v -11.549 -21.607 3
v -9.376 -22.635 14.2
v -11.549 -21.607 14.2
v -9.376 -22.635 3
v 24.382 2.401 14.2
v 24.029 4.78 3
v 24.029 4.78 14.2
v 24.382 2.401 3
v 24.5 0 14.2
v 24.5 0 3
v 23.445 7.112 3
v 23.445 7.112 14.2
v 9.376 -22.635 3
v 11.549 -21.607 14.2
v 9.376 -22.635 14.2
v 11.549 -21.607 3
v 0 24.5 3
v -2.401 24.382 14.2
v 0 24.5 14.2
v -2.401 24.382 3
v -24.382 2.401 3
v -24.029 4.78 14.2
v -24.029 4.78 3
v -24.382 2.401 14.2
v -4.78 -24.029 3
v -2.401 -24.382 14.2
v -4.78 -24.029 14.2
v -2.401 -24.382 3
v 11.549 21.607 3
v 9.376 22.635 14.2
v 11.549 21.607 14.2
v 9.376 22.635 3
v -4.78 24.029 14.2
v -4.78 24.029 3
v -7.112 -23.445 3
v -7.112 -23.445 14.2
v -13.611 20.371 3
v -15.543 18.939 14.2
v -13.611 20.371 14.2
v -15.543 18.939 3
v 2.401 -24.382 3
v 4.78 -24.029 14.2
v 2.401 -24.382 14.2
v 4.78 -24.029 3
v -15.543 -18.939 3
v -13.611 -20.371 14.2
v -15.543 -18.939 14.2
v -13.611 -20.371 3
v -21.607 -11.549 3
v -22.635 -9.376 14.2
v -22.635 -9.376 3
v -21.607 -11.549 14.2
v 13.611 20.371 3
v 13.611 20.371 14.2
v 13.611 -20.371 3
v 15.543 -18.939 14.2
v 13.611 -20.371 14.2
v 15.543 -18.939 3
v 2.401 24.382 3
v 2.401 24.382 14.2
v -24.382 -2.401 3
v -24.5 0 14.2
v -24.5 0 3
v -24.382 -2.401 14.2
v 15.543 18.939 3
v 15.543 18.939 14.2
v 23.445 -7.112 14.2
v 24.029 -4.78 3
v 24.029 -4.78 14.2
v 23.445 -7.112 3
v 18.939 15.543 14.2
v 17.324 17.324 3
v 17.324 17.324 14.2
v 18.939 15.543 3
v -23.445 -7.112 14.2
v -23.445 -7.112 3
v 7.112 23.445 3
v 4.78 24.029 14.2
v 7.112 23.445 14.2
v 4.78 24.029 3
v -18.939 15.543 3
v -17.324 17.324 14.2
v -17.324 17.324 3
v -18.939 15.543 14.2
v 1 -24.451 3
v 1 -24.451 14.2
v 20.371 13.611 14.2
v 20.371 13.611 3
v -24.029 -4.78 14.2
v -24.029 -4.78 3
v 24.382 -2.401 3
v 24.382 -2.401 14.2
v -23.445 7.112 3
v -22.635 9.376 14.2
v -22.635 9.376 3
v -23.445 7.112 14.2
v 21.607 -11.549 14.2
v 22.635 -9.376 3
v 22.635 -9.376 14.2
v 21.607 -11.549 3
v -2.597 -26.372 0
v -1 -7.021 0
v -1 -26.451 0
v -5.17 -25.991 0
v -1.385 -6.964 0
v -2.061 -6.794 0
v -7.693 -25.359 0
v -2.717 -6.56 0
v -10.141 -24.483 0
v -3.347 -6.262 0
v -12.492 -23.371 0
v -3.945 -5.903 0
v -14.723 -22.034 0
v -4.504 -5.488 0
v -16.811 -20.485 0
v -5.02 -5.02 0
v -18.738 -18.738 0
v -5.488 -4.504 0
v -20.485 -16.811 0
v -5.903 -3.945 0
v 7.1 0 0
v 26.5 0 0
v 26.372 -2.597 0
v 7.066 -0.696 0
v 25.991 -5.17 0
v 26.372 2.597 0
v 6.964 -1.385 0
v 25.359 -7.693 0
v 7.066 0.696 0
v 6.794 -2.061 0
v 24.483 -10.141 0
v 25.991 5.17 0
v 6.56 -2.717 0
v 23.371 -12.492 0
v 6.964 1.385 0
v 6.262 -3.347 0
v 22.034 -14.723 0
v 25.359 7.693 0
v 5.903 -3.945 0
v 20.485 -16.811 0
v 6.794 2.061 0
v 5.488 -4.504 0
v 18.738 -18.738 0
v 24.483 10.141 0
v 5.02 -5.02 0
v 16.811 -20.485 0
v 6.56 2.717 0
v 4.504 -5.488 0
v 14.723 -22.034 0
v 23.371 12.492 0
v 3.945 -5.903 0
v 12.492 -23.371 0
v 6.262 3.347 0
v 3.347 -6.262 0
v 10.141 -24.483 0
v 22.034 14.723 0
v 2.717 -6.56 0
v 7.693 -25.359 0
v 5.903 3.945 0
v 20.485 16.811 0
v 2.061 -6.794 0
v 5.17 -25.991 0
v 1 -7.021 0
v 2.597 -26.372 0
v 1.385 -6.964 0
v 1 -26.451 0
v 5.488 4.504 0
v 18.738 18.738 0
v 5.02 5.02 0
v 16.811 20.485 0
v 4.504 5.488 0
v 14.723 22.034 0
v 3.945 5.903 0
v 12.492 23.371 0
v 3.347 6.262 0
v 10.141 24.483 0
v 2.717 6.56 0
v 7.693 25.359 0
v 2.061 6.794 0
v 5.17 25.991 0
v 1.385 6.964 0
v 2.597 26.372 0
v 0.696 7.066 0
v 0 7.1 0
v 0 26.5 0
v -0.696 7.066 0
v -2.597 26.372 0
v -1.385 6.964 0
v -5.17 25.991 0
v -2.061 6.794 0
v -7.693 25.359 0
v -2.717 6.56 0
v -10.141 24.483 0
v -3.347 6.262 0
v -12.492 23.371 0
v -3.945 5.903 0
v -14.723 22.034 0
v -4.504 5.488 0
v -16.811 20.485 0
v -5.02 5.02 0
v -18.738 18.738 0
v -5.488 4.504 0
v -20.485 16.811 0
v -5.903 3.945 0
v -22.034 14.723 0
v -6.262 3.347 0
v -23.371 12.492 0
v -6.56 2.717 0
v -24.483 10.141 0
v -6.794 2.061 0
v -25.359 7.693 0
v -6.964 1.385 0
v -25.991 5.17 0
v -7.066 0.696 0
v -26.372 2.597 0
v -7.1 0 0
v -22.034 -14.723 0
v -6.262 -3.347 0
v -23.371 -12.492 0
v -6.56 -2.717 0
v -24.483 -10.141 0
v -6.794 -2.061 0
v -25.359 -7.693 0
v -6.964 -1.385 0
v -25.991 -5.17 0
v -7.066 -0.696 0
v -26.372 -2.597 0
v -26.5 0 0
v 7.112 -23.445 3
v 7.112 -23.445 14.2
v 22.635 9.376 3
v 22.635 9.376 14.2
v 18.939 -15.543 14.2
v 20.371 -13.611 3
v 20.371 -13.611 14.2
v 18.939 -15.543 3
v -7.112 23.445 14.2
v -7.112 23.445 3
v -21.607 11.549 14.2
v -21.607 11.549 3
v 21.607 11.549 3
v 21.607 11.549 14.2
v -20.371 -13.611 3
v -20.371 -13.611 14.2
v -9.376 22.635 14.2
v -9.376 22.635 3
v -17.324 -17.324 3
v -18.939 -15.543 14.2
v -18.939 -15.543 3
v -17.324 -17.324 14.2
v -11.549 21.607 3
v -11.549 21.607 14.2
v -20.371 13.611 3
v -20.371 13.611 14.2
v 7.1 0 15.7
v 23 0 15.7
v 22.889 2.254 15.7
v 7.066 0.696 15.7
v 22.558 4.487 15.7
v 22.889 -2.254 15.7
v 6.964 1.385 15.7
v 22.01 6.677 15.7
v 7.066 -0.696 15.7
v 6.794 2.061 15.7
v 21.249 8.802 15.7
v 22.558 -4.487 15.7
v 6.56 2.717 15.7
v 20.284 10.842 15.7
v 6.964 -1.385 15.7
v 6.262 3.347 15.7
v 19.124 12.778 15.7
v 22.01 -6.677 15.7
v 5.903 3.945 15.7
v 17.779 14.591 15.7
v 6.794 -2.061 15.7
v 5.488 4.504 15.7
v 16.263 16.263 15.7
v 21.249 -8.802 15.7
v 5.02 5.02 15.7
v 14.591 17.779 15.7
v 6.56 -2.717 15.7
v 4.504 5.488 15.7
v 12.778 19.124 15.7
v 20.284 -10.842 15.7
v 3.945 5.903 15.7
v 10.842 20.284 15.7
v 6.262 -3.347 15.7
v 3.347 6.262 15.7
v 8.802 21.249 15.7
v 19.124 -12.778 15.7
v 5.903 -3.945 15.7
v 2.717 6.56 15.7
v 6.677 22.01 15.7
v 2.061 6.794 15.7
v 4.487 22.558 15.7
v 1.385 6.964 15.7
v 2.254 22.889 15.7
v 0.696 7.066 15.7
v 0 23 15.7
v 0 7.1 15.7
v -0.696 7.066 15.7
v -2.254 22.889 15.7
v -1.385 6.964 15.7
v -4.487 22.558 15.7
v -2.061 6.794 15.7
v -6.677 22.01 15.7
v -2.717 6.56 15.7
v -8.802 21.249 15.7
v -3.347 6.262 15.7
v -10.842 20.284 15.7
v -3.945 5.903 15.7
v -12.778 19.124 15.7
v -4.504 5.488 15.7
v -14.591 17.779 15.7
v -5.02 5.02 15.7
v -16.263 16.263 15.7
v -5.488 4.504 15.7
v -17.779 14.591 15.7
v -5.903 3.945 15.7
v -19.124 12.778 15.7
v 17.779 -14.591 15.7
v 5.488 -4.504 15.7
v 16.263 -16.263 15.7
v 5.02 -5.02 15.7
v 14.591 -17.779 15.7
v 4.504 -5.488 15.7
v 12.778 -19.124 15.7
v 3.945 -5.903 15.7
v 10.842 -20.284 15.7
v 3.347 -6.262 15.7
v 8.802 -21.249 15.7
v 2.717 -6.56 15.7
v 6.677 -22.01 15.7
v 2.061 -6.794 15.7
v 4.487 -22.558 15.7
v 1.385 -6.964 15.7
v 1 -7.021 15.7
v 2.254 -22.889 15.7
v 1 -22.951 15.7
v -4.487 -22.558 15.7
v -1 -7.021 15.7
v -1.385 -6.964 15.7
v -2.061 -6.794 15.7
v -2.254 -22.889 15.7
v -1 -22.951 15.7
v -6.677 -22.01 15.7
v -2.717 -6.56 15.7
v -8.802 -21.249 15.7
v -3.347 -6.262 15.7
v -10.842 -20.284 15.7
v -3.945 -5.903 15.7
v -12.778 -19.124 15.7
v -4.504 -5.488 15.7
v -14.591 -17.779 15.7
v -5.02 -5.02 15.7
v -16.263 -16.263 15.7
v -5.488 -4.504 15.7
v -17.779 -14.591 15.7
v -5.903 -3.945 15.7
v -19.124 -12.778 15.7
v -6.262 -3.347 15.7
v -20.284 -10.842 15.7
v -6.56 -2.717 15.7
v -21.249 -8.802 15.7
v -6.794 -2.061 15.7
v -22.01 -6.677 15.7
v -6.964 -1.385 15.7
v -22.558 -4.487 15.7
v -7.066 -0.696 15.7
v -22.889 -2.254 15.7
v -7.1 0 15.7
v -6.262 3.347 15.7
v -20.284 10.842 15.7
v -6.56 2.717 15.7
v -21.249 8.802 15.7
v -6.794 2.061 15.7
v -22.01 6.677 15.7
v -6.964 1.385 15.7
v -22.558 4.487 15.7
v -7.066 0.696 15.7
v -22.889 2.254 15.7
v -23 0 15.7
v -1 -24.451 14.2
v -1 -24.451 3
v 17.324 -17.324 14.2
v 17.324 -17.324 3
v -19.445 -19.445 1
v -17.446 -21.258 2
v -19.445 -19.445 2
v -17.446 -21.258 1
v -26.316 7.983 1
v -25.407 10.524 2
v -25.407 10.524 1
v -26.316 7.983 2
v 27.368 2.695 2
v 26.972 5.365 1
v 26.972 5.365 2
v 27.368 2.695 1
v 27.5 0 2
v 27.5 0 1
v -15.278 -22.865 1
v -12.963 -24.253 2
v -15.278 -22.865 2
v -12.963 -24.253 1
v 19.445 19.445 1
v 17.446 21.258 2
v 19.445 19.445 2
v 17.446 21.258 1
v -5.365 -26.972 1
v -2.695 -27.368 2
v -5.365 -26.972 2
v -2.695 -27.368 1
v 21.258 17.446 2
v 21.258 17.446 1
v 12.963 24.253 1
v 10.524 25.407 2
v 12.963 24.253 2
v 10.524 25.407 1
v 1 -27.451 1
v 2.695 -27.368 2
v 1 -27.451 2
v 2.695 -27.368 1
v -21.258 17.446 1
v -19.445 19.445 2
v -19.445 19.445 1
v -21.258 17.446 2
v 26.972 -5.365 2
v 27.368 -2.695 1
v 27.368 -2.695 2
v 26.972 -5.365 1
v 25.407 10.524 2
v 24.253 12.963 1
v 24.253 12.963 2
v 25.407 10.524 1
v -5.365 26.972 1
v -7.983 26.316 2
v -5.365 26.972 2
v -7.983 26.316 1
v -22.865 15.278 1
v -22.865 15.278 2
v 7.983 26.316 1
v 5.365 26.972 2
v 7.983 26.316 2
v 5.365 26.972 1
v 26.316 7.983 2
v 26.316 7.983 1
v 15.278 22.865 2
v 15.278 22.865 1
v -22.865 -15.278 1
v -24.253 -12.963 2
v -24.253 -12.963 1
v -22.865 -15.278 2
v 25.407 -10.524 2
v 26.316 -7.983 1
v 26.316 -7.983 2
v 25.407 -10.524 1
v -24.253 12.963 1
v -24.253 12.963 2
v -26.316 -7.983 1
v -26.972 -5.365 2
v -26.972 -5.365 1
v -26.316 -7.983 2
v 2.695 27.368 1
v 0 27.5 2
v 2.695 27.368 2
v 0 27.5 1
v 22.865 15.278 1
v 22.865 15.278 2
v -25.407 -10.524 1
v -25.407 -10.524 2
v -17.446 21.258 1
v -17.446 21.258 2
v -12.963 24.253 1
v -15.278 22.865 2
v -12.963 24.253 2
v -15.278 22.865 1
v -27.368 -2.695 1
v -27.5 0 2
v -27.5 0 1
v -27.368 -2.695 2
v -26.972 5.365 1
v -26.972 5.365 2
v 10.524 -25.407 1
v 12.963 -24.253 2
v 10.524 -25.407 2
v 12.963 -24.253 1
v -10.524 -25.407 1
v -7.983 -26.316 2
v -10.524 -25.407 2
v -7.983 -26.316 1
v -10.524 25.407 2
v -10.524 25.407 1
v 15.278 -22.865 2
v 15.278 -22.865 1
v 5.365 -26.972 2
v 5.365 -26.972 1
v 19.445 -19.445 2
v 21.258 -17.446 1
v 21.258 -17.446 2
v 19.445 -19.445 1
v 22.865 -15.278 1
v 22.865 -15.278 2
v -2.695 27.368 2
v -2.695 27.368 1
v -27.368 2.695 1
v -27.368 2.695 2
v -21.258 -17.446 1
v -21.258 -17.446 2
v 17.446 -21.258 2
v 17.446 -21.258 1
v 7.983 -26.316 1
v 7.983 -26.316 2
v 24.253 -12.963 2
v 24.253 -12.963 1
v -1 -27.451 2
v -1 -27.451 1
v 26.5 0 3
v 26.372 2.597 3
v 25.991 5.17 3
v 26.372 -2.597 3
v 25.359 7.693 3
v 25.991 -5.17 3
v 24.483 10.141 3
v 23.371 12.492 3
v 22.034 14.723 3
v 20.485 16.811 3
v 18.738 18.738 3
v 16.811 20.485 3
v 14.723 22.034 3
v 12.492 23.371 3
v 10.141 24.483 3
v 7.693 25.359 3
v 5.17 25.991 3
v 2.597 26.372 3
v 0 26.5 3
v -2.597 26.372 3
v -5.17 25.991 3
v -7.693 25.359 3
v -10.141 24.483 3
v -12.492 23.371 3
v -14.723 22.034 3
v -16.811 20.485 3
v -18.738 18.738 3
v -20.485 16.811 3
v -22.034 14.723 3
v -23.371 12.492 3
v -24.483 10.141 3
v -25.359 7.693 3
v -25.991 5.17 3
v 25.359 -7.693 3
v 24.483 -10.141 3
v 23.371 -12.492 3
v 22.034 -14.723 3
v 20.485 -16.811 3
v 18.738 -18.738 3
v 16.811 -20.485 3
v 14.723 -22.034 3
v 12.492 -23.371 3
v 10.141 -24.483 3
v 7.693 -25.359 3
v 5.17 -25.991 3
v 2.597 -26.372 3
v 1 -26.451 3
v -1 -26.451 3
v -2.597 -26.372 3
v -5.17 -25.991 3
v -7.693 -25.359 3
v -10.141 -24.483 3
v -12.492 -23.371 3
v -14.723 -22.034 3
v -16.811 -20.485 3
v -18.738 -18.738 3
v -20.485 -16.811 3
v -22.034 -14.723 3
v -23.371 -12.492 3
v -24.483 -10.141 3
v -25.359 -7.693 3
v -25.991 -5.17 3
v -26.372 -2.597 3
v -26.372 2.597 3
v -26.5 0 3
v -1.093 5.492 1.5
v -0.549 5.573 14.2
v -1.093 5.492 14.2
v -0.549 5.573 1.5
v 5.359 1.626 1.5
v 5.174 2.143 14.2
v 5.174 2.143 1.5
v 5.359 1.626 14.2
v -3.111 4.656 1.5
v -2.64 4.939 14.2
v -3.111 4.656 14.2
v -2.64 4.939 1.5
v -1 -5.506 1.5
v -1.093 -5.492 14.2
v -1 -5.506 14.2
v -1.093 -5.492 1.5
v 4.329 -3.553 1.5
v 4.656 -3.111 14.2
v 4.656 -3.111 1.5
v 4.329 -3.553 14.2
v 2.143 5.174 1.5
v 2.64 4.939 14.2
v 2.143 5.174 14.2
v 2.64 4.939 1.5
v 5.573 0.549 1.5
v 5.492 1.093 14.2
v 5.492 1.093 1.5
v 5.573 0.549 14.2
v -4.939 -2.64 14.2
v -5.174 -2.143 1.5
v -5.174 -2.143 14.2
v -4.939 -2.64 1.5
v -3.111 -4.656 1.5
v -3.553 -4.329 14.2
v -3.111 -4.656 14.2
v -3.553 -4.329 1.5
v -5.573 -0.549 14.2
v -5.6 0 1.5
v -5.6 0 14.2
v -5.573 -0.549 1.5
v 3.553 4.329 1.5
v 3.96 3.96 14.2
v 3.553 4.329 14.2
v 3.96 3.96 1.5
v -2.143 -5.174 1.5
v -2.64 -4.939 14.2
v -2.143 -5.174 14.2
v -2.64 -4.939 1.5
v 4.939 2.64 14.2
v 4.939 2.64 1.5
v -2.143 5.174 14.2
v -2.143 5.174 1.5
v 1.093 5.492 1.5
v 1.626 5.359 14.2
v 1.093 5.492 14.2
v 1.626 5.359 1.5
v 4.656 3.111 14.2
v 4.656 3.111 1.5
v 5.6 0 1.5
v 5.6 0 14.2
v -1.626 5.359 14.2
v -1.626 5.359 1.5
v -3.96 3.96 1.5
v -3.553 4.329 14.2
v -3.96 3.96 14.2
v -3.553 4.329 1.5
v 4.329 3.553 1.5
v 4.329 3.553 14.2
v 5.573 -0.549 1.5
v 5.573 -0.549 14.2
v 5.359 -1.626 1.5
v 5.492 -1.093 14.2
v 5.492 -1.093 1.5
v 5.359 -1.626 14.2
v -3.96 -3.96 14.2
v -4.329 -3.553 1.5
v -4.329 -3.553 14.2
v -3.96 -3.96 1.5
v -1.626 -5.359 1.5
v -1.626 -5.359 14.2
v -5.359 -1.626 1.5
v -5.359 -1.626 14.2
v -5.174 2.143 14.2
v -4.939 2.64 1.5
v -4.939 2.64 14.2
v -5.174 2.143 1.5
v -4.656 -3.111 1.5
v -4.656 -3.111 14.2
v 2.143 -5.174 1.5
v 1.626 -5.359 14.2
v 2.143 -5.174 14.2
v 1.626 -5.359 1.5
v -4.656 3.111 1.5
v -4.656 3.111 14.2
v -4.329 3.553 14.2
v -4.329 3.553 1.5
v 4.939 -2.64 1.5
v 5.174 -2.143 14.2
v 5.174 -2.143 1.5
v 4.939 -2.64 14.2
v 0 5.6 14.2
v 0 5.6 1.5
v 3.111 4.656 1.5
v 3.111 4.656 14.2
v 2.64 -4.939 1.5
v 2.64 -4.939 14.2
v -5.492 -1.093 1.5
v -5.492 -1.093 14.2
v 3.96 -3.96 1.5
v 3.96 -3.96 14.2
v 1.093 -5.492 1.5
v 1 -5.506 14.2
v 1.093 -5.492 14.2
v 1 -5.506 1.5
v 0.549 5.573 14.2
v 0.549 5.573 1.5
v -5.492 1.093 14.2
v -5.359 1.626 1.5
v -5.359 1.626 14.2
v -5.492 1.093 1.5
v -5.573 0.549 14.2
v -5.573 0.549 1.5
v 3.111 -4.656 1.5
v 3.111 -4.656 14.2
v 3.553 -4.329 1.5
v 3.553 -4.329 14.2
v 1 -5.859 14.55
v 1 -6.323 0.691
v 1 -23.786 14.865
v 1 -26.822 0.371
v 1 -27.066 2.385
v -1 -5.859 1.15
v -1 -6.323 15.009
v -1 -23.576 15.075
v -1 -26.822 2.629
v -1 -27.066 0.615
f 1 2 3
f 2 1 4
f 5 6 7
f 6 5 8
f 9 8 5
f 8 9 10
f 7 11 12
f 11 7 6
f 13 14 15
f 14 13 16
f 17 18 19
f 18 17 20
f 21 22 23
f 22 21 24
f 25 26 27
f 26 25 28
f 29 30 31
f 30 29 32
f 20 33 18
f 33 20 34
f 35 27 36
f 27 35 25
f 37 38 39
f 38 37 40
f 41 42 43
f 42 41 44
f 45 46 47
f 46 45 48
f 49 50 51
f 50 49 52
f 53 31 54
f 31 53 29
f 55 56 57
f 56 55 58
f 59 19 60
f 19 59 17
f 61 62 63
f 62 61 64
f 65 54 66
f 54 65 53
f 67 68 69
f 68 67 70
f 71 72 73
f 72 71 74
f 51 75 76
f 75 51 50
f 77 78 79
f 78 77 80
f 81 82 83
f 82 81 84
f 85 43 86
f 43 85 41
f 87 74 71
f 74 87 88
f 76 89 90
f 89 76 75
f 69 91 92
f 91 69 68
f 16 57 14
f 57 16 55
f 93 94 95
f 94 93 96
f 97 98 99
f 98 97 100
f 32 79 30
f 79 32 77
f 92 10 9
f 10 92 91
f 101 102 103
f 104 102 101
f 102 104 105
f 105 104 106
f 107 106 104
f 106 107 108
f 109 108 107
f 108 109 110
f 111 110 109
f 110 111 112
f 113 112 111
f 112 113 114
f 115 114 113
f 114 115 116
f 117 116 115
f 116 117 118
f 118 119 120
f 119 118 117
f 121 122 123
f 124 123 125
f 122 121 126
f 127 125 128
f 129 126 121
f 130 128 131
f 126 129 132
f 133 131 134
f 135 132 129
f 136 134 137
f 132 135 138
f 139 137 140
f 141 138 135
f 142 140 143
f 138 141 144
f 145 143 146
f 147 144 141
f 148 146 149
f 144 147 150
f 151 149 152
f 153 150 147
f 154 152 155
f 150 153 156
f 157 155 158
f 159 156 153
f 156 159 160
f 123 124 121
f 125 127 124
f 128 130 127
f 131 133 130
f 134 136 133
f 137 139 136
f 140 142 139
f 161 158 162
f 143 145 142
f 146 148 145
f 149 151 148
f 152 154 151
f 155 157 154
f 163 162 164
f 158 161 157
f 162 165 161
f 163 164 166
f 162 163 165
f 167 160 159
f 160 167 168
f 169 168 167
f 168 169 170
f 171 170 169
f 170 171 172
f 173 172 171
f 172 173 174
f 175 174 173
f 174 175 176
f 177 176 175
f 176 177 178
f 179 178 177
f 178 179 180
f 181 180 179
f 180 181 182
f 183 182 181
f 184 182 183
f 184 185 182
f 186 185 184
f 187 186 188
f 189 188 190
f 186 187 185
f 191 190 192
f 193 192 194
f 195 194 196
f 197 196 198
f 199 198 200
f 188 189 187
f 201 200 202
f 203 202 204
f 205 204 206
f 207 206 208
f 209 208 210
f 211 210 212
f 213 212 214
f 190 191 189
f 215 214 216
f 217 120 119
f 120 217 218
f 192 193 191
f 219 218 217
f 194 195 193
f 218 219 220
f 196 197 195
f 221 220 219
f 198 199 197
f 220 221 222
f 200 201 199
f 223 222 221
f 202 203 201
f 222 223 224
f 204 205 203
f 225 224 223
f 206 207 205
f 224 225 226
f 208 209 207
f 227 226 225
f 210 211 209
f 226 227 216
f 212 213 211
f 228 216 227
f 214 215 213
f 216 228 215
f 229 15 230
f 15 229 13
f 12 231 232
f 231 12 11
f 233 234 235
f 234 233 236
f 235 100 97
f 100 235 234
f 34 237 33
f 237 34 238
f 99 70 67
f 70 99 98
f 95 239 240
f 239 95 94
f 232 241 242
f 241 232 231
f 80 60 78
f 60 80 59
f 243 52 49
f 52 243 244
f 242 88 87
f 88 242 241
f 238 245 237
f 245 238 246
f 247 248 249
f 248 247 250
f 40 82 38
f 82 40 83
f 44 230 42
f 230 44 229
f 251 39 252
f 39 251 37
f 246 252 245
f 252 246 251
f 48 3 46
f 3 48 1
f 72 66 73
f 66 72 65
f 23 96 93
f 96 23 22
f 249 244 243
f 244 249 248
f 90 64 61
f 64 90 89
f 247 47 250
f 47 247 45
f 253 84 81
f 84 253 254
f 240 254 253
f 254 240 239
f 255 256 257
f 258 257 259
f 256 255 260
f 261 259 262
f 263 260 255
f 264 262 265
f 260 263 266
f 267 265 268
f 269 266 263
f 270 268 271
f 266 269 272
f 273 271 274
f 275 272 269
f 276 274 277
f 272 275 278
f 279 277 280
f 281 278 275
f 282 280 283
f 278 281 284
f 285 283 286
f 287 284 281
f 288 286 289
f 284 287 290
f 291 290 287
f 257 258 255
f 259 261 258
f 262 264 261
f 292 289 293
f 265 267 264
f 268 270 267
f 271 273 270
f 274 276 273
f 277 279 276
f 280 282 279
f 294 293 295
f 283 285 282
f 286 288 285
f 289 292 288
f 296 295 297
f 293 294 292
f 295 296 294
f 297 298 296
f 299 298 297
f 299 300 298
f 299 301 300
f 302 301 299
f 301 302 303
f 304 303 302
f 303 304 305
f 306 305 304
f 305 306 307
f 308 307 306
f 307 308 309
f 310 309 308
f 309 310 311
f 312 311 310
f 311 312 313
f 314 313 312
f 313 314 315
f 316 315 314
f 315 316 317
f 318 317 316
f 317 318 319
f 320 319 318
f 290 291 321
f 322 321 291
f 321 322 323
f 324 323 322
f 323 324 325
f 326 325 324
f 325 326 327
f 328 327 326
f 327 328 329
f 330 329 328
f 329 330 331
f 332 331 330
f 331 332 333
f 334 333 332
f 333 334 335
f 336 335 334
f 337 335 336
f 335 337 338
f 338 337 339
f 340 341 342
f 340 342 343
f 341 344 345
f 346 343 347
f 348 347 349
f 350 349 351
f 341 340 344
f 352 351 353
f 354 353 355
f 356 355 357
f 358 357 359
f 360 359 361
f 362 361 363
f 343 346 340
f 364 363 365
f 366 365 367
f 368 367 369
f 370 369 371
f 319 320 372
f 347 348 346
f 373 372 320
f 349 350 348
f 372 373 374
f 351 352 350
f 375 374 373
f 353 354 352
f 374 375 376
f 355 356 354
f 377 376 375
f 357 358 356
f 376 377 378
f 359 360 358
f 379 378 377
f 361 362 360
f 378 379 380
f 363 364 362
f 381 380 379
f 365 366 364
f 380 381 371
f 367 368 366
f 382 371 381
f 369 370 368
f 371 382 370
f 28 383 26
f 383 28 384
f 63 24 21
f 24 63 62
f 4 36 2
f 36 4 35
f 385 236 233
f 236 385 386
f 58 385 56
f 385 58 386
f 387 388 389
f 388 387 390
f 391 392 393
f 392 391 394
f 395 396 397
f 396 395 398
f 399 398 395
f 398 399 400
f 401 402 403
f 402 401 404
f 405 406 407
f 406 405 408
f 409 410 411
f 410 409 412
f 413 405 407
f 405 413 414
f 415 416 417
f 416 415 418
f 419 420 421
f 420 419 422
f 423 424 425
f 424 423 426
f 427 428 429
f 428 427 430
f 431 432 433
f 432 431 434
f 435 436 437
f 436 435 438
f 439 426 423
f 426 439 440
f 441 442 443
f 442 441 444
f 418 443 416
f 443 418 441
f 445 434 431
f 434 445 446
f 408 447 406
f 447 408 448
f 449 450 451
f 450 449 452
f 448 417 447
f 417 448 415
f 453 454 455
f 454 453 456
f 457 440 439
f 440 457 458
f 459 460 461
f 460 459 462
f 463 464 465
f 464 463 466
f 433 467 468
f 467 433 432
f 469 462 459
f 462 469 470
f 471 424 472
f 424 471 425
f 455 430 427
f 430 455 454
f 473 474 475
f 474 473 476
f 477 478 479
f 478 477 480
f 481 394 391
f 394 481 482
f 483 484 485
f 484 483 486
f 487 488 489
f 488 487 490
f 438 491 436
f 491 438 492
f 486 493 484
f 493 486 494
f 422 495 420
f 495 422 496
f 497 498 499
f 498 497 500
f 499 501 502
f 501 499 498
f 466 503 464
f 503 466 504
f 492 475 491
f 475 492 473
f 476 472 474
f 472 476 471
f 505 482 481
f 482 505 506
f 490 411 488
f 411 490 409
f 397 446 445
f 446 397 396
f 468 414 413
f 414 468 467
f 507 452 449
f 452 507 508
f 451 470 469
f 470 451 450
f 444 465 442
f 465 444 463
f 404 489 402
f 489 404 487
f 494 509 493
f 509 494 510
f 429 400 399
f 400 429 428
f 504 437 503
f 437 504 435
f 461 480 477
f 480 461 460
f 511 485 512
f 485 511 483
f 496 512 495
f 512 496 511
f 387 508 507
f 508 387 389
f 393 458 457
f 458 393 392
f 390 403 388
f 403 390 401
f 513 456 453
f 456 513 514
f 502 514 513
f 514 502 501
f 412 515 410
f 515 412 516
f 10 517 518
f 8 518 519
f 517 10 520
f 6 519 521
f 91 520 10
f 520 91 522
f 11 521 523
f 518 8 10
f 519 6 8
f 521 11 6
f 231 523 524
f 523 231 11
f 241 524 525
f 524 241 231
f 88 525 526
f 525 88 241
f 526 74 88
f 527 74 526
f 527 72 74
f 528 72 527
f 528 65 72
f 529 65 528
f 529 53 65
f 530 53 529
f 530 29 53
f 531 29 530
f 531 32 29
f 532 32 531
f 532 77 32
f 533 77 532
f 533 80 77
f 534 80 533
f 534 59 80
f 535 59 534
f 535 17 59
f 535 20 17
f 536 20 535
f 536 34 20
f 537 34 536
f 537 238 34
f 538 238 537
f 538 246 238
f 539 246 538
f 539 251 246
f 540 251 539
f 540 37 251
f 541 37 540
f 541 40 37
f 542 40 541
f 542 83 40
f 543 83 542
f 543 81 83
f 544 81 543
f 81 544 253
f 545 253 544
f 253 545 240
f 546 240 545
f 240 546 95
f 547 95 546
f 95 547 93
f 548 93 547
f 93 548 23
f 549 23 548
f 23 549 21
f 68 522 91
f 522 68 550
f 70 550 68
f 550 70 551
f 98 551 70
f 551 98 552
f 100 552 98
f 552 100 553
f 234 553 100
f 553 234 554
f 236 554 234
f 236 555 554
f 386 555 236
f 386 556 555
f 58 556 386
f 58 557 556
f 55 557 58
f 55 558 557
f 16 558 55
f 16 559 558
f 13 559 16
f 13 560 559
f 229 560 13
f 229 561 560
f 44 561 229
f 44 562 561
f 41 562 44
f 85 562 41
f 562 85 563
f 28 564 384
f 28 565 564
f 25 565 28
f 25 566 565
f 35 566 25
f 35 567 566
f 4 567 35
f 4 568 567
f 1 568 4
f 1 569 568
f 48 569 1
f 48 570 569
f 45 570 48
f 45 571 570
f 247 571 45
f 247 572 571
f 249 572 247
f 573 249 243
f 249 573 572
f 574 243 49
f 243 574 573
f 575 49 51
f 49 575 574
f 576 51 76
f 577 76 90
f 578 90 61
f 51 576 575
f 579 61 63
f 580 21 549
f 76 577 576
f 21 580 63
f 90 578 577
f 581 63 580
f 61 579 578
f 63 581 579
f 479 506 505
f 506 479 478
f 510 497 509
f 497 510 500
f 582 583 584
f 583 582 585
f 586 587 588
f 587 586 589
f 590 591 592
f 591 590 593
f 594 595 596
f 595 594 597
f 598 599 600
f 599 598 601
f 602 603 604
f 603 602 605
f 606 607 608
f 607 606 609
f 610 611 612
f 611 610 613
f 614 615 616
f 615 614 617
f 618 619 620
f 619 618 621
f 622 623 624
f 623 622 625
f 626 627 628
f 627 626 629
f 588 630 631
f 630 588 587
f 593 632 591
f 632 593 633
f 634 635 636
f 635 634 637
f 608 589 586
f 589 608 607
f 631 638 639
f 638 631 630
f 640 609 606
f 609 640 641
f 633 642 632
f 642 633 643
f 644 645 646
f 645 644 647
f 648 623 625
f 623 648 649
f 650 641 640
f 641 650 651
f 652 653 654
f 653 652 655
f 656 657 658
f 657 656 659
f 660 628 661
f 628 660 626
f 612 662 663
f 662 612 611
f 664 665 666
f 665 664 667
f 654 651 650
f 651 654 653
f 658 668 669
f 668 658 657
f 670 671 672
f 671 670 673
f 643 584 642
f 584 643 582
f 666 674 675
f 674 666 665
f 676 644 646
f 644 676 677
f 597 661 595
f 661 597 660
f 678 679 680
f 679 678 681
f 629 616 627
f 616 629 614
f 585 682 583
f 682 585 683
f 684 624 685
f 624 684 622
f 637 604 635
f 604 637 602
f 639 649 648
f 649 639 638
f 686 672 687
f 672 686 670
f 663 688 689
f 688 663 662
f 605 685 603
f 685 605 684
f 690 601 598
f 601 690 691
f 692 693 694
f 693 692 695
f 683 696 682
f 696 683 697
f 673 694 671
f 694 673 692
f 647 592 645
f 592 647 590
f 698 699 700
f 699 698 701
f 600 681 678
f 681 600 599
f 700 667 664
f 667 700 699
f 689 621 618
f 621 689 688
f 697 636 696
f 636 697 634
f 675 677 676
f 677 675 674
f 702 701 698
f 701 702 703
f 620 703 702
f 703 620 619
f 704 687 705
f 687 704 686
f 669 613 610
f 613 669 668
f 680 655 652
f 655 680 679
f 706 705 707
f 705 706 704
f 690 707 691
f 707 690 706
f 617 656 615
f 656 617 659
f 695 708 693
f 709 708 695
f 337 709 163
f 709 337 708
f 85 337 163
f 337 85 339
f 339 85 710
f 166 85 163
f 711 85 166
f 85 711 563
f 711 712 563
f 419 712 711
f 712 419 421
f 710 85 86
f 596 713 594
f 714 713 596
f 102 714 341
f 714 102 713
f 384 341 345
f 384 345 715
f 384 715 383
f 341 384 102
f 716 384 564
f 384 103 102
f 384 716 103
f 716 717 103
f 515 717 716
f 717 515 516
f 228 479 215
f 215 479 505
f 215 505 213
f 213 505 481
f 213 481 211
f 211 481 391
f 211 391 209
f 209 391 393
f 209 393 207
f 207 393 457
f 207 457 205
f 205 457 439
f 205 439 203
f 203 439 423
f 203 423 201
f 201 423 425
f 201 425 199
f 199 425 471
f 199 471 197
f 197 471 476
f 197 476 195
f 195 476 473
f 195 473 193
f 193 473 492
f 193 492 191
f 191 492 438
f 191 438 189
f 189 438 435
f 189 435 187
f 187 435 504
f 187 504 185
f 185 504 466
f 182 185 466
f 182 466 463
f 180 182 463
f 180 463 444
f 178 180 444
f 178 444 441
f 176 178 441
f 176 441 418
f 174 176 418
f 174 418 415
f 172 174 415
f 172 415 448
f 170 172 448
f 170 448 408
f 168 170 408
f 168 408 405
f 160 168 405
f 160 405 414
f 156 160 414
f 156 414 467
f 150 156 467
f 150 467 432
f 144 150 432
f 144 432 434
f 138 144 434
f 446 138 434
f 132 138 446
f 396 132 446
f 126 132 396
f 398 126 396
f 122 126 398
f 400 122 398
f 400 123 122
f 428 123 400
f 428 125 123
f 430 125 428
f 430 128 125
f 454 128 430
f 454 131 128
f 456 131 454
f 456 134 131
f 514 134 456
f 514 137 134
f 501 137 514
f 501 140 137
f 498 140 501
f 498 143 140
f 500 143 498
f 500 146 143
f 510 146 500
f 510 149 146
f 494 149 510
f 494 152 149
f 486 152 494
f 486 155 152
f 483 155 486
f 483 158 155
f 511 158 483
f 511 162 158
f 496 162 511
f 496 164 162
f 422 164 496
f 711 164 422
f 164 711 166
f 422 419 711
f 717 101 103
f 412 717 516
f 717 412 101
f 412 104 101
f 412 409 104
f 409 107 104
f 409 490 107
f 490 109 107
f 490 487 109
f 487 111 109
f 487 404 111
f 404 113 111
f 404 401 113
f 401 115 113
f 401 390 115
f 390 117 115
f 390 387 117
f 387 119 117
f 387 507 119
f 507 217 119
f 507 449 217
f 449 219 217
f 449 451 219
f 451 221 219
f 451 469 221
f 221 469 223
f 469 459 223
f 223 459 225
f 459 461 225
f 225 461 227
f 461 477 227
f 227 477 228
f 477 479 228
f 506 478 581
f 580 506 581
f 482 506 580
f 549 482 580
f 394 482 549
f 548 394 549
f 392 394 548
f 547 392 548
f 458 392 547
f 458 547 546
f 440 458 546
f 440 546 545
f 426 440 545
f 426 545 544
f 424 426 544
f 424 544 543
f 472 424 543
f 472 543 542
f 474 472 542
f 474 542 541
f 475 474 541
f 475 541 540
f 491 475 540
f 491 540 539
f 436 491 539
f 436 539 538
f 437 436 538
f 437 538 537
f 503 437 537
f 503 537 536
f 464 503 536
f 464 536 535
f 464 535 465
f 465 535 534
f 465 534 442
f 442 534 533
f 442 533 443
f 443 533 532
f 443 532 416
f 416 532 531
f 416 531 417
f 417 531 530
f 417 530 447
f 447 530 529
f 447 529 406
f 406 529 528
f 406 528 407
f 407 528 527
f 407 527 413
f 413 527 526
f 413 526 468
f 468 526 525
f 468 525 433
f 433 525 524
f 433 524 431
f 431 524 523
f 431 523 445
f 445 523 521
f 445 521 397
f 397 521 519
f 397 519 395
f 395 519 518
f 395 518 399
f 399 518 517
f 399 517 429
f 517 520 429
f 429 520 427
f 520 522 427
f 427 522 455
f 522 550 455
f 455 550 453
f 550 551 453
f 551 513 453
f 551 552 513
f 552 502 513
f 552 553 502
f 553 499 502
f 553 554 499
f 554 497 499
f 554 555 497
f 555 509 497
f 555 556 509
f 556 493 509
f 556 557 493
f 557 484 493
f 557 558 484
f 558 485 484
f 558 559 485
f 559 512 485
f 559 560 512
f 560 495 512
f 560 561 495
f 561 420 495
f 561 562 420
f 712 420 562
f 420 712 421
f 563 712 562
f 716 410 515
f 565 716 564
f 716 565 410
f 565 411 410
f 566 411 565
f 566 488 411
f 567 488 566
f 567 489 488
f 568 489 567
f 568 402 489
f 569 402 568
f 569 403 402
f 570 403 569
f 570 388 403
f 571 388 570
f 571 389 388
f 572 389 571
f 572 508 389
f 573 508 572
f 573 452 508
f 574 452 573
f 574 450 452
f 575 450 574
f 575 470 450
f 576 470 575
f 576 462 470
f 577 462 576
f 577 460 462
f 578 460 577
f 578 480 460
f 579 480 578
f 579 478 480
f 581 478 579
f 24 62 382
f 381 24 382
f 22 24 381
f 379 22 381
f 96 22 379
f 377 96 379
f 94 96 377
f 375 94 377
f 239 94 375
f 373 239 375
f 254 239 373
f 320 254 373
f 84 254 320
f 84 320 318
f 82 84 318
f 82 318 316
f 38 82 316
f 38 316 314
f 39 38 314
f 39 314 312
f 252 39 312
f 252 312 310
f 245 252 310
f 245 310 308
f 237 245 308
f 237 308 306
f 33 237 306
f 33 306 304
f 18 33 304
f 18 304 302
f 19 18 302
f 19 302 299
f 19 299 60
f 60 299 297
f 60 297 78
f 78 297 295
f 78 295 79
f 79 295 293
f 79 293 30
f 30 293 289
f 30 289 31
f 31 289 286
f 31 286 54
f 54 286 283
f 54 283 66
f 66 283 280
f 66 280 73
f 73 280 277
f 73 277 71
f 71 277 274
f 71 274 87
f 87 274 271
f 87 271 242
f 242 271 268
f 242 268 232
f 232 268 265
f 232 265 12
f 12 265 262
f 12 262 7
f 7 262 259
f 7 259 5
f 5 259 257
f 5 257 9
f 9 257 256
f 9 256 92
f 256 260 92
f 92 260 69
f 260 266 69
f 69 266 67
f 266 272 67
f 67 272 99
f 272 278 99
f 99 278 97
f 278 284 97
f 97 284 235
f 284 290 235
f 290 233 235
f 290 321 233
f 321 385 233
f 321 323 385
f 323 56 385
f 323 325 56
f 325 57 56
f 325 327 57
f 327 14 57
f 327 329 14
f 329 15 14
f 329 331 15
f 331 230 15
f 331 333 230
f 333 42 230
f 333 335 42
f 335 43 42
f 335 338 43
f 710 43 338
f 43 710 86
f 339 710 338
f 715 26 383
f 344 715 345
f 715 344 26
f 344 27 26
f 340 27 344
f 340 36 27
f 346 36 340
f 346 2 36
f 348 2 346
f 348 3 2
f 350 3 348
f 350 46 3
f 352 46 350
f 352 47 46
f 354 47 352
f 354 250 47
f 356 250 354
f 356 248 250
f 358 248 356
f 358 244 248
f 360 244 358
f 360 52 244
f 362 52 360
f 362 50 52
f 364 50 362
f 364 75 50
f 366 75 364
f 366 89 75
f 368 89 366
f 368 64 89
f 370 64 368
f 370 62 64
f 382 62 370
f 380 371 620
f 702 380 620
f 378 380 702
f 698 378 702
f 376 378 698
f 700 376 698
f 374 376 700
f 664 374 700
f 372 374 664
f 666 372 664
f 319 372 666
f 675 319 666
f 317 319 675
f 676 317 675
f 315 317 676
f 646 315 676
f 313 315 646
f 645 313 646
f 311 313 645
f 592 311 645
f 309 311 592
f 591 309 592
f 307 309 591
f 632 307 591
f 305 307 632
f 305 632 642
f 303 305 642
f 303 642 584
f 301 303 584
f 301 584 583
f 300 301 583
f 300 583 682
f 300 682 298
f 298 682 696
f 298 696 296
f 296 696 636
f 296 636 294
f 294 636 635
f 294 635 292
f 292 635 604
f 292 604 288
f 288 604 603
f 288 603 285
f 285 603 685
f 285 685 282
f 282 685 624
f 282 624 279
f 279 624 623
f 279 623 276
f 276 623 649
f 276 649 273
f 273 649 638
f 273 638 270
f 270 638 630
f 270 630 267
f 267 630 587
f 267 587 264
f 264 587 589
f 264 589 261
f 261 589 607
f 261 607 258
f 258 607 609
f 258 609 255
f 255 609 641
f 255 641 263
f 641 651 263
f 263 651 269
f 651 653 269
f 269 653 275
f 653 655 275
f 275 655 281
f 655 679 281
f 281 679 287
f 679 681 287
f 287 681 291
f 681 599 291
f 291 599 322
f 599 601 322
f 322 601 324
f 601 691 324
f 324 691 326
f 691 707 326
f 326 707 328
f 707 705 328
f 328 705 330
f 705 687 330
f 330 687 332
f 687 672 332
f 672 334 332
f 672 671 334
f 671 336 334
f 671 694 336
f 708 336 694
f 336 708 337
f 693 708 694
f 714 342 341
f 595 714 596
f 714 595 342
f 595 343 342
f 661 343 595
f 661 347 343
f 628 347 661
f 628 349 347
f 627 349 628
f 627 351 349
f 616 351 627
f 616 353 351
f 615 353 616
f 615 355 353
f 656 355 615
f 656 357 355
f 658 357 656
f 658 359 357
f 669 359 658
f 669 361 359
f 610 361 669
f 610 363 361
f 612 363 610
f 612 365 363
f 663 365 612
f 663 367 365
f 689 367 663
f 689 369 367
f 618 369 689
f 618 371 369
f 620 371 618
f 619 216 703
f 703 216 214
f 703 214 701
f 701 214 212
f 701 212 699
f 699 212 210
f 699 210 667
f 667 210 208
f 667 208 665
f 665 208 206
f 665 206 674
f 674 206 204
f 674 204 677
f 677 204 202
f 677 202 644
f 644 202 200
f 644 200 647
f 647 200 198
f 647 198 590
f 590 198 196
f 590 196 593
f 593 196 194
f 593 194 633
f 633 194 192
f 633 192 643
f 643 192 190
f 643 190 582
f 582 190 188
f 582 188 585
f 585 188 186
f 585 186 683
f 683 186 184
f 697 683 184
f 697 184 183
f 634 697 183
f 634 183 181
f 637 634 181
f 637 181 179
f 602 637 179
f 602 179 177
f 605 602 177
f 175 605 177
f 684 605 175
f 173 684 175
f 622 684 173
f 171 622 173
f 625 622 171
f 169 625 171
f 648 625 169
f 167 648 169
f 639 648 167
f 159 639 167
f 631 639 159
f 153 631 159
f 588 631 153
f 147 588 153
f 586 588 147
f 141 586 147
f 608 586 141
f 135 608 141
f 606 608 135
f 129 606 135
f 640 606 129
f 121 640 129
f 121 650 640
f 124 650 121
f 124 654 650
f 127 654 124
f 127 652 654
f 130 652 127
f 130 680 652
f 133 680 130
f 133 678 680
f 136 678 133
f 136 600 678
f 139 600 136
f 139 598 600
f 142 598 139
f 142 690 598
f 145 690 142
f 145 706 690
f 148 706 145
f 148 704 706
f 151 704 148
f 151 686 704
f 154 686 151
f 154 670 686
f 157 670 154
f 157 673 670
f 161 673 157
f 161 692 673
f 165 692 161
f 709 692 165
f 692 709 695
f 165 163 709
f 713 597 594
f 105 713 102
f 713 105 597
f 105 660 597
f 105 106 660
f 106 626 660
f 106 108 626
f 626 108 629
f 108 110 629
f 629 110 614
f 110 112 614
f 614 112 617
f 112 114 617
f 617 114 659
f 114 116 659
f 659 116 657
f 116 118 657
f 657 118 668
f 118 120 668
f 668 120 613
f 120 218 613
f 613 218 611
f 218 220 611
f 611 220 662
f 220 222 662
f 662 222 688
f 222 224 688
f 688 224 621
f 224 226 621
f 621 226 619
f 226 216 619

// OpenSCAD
//Parametric Adapter Tool Holder
//I made this to fit a sharpie in my Master Grip tool holder
//8/24/2015 By: David Bunch
//
//CUSTOMIZER VARIABLES

//1. Diameter of Inserted Adapter
OD = 49.0;

//2. Diameter of opening for smaller tool
ID = 11.2;          //This was a nice somewhat loose fit of a Sharpie Fine Point
                    //10.0 is about the diameter of a Sharpie Ultra Fine Point

//3. Diameter of Lip
LipThk = 3;

//4. Height of Lip
LipHt = 3;

//5. Height of Adapter Portion
Ht = 12.7;

//6. Resolution of Cylinder
I_Res = 64;

//CUSTOMIZER VARIABLES END

TotHt = Ht + LipHt;

LipOD = OD + LipThk + LipThk;
$fn = I_Res;

LipRad = LipOD / 2;

Rad = OD / 2;

RadID = ID / 2;
module DrawUnion()
{
    union()
    {
        cylinder(d=OD,h=TotHt);
        cylinder(d=LipOD,h=LipHt);
    }
}
difference()
{
    DrawUnion();
    translate([0,0,-1])
    cylinder(d=ID,h=TotHt+2);
    translate([-1,-32,-1])
    cube([2,32,TotHt+2]);
//Chamfer the outer bottom lip
    translate([0,0,0])
    rotate_extrude(convexity = 10, $fn = I_Res)
    translate([LipRad, 0, 0])
    circle(r = 1, $fn = 4);
//Chamfer the outer bottom lip
    translate([0,0,3])
    rotate_extrude(convexity = 10, $fn = I_Res)
    translate([LipRad, 0, 0])
    circle(r = 1, $fn = 4);
//Chamfer the outer top edge
    translate([0,0,TotHt])
    rotate_extrude(convexity = 10, $fn = I_Res)
    translate([Rad, 0, 0])
    circle(r = 1.5, $fn = 4);
//Chamfer the top of Tool Adapter
    translate([0,0,TotHt])
    rotate_extrude(convexity = 10, $fn = I_Res)
    translate([RadID, 0, 0])
    circle(r = 1.5, $fn = 4);
//Chamfer the bottom of Tool Adapter
    translate([0,0,0])
    rotate_extrude(convexity = 10, $fn = I_Res)
    translate([RadID, 0, 0])
    circle(r = 1.5, $fn = 4);
}
